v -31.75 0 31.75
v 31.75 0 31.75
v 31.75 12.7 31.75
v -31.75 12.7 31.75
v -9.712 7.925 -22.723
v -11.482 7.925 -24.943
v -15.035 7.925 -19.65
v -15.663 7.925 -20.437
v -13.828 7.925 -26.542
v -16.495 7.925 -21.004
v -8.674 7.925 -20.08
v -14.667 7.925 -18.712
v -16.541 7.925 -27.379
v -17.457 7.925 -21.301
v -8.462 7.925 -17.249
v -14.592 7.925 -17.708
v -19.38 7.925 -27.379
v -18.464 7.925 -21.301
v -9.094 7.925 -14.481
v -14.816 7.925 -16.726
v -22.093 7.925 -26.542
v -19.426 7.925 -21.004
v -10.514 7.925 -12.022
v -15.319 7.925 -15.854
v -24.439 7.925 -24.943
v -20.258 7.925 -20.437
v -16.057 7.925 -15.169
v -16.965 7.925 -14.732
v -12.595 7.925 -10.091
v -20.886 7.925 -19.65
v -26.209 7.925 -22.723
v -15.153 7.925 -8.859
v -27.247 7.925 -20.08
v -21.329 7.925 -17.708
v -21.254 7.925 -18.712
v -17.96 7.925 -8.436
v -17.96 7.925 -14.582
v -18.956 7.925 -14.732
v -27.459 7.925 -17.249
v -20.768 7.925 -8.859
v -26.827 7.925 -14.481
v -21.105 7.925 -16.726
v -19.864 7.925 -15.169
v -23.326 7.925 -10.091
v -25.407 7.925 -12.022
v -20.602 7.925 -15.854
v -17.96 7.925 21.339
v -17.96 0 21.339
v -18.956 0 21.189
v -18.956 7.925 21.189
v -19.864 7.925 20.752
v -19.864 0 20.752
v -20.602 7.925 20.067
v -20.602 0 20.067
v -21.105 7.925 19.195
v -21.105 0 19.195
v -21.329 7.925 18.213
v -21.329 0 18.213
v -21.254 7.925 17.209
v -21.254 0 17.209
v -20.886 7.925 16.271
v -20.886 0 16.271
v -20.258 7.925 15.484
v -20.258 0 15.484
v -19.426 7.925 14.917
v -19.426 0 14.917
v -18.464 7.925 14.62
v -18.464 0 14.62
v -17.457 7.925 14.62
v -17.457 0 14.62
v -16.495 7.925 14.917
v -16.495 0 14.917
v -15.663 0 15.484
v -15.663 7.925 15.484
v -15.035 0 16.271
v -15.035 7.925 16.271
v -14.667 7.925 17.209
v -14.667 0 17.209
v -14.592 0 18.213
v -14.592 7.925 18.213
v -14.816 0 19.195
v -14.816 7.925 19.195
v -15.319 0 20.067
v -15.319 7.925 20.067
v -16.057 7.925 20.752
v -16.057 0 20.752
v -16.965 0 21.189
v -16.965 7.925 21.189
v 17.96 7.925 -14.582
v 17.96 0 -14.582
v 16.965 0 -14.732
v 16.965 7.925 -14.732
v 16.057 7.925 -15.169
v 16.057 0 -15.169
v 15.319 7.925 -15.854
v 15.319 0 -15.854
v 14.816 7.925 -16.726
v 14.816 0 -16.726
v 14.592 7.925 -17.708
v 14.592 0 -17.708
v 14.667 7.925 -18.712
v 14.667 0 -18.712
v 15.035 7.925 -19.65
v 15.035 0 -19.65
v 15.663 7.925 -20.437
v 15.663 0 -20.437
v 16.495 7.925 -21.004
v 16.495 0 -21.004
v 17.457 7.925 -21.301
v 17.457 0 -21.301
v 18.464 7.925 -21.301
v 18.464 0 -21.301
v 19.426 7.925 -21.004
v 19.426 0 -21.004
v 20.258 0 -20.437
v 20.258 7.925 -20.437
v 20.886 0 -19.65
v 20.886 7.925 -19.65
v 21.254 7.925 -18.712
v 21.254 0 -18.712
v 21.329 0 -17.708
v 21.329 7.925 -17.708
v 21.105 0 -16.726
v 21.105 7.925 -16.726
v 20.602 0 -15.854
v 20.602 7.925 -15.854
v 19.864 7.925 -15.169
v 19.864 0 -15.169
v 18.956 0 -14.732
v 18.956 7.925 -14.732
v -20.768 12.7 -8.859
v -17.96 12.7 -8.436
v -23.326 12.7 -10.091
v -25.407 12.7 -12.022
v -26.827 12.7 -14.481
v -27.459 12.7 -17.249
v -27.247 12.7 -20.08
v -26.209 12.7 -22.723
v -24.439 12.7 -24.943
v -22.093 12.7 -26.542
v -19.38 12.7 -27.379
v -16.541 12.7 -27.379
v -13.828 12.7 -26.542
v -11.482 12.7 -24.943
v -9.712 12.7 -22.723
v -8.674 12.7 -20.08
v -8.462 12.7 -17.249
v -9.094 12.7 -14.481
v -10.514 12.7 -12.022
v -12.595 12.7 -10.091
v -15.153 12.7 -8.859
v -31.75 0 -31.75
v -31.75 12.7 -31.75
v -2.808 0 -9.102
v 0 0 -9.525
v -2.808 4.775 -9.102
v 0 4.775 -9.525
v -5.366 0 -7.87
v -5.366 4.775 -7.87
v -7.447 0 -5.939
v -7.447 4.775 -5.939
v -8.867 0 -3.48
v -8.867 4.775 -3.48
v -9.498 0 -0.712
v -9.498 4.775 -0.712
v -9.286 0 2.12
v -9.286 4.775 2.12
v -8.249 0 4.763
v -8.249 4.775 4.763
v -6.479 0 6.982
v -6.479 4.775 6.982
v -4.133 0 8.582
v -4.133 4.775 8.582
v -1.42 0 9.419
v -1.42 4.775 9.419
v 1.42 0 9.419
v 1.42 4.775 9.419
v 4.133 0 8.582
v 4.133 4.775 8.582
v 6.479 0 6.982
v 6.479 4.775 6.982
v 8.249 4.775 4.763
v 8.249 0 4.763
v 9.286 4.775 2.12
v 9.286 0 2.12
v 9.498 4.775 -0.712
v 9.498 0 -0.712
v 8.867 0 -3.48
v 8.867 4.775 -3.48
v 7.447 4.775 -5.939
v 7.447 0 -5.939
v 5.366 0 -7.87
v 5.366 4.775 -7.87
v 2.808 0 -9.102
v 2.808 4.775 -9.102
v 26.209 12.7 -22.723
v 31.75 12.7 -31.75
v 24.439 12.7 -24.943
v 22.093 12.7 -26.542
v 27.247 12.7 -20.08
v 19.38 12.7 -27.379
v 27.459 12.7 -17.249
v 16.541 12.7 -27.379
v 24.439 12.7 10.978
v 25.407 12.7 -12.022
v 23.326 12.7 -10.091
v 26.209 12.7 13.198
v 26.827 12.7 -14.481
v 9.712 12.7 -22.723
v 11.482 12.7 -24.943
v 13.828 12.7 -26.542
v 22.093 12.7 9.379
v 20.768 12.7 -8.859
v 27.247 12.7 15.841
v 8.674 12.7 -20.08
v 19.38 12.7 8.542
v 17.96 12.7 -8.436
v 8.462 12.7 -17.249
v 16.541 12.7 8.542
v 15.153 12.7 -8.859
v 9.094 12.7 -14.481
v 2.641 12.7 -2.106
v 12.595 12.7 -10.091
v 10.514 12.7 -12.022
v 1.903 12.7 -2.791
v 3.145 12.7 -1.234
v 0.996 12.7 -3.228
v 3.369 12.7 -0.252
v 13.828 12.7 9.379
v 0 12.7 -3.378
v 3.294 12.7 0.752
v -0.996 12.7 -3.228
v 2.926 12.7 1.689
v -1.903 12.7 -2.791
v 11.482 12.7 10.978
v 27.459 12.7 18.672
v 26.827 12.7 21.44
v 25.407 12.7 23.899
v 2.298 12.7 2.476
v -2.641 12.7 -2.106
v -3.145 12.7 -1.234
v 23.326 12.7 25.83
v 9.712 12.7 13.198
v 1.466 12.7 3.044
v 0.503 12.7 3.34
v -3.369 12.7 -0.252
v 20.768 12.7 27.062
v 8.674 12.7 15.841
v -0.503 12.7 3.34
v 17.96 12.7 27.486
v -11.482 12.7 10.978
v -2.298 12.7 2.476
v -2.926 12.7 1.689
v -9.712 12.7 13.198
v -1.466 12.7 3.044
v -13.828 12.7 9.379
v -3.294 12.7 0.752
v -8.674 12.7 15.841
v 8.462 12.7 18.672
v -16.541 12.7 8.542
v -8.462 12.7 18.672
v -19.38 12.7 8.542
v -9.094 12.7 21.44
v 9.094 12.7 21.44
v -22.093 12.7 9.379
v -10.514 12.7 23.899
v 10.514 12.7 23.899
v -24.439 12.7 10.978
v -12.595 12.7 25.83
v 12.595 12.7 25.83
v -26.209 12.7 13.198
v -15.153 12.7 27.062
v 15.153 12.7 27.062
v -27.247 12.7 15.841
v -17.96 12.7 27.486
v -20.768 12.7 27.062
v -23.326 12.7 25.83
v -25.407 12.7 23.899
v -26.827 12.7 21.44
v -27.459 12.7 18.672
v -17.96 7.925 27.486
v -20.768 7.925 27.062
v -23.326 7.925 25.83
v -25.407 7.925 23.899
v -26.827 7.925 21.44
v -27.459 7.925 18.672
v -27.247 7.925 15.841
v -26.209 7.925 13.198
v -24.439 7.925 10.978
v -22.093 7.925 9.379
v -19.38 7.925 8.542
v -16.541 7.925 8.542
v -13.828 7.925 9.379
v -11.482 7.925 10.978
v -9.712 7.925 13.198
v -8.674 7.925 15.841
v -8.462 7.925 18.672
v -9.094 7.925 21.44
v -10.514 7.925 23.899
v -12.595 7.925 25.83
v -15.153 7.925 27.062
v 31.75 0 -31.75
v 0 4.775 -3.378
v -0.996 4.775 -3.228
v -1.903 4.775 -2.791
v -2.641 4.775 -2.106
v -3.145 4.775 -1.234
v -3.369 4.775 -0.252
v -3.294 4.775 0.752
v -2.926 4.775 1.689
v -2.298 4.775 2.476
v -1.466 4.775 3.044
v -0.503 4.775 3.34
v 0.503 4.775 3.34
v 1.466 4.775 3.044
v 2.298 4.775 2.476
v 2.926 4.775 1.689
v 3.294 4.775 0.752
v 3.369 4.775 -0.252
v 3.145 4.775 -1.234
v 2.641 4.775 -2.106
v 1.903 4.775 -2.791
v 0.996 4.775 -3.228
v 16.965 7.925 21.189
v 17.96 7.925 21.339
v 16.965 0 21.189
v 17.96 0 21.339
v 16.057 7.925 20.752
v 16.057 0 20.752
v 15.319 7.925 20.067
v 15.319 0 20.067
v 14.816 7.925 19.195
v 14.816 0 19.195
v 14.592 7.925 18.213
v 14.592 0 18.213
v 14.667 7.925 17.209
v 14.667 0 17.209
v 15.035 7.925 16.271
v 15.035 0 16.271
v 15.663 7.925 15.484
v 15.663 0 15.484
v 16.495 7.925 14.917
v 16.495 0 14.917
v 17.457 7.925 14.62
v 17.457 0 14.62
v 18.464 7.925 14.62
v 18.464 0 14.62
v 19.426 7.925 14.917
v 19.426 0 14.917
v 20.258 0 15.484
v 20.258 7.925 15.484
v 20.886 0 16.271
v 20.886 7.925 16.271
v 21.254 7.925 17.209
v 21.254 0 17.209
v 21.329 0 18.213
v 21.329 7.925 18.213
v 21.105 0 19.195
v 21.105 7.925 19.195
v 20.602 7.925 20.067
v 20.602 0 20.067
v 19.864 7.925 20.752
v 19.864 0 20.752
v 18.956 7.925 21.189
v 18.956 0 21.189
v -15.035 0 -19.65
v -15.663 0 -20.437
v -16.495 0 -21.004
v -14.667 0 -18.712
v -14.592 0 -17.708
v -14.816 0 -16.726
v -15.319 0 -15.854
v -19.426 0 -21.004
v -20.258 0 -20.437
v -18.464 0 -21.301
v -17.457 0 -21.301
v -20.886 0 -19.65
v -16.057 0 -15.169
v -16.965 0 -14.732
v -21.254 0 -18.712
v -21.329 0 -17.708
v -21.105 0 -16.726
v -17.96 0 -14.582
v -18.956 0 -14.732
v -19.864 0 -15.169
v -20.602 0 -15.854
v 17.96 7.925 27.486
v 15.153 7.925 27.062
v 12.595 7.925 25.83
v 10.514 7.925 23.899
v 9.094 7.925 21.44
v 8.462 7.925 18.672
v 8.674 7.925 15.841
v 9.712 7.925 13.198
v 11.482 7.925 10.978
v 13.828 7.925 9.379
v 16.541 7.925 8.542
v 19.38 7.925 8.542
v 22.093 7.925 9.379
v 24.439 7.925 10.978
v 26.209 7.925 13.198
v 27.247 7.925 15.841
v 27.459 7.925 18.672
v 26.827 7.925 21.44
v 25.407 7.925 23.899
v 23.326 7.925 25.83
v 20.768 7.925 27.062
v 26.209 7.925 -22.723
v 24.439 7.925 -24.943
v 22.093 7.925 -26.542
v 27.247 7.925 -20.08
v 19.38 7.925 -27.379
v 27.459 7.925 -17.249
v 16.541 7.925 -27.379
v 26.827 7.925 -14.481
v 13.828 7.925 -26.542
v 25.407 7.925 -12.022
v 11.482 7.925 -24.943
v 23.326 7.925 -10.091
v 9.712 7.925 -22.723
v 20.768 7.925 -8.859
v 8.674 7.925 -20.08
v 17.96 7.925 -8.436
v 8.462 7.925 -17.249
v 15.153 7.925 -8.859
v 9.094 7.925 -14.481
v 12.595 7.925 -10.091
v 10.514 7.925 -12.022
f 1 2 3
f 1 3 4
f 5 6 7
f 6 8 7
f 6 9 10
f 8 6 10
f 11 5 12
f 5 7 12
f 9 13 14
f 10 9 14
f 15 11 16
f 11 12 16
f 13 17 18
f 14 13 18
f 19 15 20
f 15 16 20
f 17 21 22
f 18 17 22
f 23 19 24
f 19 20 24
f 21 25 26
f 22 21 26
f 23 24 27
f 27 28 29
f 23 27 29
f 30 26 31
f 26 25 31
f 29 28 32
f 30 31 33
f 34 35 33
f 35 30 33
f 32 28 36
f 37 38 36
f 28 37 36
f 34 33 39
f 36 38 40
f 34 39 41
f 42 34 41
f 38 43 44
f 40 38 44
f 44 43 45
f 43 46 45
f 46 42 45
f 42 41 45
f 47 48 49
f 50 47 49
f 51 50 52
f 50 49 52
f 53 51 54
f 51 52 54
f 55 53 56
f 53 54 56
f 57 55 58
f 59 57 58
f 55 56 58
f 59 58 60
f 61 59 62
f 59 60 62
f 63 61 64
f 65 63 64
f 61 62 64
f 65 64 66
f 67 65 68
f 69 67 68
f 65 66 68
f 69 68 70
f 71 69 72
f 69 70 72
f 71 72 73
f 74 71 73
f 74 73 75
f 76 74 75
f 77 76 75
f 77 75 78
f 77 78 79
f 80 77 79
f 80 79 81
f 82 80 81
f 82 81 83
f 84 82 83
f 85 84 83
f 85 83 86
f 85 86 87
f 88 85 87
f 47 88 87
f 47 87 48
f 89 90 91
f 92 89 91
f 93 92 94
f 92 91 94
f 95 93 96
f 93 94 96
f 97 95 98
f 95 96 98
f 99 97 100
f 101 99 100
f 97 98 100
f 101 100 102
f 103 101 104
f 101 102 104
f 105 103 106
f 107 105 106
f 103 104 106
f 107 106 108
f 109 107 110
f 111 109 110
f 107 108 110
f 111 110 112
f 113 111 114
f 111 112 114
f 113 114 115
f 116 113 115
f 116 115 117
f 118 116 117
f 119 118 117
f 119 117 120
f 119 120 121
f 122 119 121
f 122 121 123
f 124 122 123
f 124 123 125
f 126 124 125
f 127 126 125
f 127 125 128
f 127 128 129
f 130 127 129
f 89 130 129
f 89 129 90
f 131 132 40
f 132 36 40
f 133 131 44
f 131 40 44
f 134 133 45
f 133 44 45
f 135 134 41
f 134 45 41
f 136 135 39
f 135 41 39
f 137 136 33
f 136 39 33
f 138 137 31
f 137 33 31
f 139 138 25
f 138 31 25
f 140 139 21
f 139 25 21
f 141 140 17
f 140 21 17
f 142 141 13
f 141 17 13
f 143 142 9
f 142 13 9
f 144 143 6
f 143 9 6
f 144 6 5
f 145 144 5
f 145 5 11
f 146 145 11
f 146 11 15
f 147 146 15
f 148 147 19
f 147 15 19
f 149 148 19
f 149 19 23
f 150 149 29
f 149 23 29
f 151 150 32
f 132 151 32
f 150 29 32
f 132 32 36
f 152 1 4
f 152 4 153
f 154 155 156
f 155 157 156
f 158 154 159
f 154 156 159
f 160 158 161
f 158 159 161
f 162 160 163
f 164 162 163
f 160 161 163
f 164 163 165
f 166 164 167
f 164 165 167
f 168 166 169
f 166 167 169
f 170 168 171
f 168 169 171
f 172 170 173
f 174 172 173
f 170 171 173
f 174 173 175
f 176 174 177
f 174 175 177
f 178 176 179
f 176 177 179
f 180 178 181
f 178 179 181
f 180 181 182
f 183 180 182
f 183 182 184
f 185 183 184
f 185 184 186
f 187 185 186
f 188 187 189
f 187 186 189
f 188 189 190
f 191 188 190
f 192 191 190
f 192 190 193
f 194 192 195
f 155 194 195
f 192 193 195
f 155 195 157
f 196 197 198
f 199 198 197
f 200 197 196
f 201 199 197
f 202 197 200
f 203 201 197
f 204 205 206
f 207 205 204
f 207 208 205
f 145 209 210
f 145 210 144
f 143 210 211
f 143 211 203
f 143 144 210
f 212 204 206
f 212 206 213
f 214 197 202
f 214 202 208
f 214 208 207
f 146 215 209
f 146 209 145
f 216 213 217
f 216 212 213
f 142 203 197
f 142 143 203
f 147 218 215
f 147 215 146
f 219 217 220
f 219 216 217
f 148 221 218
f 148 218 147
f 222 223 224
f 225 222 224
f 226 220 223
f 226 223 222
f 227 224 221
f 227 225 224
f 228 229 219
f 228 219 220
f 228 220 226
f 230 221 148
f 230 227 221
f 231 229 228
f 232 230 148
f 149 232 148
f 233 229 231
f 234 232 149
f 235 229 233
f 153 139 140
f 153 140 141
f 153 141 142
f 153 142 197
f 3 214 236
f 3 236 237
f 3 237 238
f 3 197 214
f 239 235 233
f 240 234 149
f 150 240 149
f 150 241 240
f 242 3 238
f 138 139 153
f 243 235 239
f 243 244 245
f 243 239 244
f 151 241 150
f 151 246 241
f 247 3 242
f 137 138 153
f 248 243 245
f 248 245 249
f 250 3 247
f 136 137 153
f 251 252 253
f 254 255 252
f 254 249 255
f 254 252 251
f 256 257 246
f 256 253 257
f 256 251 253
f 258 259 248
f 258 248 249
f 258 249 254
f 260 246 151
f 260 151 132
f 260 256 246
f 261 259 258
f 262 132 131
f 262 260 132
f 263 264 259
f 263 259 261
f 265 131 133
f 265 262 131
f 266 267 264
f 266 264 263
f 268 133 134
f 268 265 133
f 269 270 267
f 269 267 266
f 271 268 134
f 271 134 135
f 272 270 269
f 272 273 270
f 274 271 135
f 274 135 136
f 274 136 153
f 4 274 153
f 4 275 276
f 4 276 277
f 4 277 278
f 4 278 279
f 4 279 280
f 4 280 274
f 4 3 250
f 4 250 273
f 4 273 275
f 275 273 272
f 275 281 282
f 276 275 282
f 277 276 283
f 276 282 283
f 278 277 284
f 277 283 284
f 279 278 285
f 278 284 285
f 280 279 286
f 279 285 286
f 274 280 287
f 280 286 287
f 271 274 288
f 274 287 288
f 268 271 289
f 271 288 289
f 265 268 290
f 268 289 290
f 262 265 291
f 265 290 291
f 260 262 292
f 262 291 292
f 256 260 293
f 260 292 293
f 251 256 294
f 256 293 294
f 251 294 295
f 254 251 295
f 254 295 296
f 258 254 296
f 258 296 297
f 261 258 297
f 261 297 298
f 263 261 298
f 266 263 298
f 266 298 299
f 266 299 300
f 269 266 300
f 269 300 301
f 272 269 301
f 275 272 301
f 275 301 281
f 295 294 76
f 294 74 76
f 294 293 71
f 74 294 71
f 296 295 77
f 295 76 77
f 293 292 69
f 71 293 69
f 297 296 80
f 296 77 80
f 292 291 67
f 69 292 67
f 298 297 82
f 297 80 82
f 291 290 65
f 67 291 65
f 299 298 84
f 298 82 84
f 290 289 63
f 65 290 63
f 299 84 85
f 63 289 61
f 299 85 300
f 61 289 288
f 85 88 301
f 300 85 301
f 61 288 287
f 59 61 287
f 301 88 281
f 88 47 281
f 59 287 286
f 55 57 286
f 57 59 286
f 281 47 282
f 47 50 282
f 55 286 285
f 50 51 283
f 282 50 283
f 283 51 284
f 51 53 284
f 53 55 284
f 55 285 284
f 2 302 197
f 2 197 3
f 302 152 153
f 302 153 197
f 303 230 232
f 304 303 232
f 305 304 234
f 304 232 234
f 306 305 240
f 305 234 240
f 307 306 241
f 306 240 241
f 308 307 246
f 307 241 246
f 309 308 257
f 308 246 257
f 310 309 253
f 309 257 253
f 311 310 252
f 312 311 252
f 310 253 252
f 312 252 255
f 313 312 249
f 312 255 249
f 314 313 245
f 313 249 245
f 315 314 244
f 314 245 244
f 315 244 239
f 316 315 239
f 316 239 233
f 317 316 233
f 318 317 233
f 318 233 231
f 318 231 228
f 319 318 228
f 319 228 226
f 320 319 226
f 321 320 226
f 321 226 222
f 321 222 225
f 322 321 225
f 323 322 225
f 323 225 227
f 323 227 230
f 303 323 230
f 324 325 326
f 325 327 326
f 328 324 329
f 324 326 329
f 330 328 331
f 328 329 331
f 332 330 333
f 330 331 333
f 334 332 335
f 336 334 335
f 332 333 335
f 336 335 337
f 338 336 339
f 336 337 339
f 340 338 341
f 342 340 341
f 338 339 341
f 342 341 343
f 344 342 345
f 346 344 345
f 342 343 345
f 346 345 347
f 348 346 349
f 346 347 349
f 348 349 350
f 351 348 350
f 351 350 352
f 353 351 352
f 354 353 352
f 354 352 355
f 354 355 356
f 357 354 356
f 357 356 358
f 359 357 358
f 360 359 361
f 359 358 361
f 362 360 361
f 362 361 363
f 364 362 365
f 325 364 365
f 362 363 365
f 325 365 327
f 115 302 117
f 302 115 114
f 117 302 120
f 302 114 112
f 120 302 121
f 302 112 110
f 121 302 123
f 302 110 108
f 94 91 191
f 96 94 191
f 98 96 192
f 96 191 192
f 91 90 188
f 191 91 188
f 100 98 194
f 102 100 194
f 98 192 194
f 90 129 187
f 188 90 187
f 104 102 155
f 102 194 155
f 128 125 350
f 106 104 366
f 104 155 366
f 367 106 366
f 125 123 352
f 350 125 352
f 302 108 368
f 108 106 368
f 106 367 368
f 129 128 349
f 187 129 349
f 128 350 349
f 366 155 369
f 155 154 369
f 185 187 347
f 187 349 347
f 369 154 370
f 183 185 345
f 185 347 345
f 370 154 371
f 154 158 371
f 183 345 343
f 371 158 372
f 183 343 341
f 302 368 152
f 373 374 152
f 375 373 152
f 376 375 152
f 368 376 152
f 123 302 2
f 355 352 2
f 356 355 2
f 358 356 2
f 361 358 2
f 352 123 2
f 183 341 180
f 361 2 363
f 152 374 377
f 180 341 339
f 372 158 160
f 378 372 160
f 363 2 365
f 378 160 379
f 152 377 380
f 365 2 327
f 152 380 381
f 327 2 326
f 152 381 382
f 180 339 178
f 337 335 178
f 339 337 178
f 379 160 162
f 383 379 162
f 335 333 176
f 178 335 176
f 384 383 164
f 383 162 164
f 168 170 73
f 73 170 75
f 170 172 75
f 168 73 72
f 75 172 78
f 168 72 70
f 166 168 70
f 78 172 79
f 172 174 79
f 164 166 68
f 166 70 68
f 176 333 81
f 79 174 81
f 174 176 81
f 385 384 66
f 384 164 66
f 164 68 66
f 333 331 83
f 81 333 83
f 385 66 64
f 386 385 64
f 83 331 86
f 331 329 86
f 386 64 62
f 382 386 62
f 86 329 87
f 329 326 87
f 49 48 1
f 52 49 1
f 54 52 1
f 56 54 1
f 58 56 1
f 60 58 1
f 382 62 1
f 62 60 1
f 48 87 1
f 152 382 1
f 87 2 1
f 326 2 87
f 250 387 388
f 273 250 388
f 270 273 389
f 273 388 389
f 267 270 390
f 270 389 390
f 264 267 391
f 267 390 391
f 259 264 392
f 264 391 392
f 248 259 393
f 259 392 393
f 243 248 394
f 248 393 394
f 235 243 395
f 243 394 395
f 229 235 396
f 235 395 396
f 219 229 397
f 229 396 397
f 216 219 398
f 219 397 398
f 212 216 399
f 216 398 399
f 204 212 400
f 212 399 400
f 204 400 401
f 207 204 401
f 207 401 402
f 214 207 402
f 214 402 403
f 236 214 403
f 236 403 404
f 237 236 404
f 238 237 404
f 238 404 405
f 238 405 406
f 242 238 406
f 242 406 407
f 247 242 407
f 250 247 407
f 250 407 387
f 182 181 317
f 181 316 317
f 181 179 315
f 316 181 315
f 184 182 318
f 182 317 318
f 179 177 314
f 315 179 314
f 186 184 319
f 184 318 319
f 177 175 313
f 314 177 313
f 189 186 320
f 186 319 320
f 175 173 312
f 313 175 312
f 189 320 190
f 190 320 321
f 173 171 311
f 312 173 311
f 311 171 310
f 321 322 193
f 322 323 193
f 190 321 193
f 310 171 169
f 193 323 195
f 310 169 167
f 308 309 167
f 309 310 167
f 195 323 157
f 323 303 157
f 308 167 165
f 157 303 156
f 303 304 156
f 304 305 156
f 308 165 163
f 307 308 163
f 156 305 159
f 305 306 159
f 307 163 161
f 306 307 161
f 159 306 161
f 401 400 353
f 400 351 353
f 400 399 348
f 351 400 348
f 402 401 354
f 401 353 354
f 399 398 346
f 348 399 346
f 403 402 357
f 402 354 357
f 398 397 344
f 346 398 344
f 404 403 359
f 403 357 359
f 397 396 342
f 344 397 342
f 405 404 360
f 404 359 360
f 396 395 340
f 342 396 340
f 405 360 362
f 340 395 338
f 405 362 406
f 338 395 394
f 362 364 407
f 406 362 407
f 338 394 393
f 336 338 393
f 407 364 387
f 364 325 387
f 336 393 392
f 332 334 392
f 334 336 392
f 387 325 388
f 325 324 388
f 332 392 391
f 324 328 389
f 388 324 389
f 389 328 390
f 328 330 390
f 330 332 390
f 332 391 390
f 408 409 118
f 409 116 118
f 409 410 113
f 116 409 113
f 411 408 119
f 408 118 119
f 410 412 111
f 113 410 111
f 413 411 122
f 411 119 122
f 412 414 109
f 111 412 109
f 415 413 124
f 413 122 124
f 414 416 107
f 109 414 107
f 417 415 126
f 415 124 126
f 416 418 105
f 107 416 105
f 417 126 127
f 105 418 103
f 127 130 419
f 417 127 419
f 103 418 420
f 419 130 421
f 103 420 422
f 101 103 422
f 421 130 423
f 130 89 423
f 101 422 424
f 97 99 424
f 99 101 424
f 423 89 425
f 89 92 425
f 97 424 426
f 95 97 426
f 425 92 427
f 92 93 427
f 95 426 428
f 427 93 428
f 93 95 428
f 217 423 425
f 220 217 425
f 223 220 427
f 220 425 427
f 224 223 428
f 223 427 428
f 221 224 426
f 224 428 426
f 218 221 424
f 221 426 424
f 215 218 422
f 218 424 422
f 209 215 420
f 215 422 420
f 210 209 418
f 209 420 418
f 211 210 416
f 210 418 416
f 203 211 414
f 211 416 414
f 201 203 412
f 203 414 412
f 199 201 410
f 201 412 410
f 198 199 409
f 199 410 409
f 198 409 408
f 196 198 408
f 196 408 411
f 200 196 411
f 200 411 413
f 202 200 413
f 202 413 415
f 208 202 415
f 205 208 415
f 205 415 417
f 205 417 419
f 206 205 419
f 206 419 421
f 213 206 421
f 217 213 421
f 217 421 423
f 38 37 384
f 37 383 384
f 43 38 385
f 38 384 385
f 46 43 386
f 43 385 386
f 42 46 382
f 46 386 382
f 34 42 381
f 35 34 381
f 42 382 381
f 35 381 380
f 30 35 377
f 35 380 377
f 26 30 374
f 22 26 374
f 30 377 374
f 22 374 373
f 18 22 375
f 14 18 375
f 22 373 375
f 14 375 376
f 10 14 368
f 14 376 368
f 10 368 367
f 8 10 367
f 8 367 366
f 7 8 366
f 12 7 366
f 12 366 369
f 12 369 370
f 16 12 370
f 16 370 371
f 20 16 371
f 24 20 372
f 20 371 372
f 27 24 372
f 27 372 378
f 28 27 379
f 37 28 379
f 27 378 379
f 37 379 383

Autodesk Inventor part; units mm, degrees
ref_plane "YZ Plane" through (0, 0, 0) normal (1, 0, 0) x (0, 1, 0)
ref_plane "XZ Plane" through (0, 0, 0) normal (0, 1, 0) x (-1, 0, 0)
ref_plane "XY Plane" through (0, 0, 0) normal (0, 0, 1) x (1, 0, 0)
sketch "Sketch1" plane through (0, 0, 0) normal (0, 1, 0) x (-1, 0, 0)
  line L0 (-31.75, 31.75) -> (31.75, 31.75)
  line L1 (31.75, 31.75) -> (31.75, -31.75)
  line L2 (31.75, -31.75) -> (-31.75, -31.75)
  line L3 (-31.75, -31.75) -> (-31.75, 31.75)
  line L4 (-31.75, 31.75) -> (31.75, -31.75) construction
  line L5 (31.75, 31.75) -> (-31.75, -31.75) construction
  point P0 (0, 0)
  dimension "d0" = 63.5
  dimension "d1" = 63.5
extrude "Extrusion1" add sketch "Sketch1" along normal blind 12.7
sketch "Sketch2" plane through (0, 12.7, 0) normal (0, 1, 0) x (1, 0, 0)
  line L0 (0, 0) -> (17.9605, 17.9605)
  line L1 (0, 0) -> (25.4, 0) construction
  line L2 (0, 0) -> (-17.9605, 17.9605)
  line L3 (0, 0) -> (-17.9605, -17.9605)
  line L4 (0, 0) -> (17.9605, -17.9605)
  dimension "d4" = 25.4
  dimension "d5" = 45
  dimension "d8" = 360
hole "Hole1" at (17.9605, 12.7, 17.9605) at (-17.9605, 12.7, -17.9605) at (-17.9605, 12.7, 17.9605) at (17.9605, 12.7, -17.9605) direction (0, -1, 0) diameter 6.7564 end up to surface counterbore diameter 19.05 counterbore depth 4.7752 clearance for "Hex Head Bolt" size "1/4" standard "Ansi Unified Screw Threads"
sketch "Sketch3" plane through (0, 0, 0) normal (0, -1, 0) x (1, 0, 0)
  circle A0 centre (0, 0) radius 12.7
  dimension "d17" = 25.4
hole "Hole2" at (0, 0, 0) direction (0, 1, 0) diameter 6.7564 end up to surface counterbore diameter 19.05 counterbore depth 4.7752 clearance for "Hex Head Bolt" size "1/4" standard "Ansi Unified Screw Threads"
properties part number "feet type 1 part 1" material "Stainless Steel"
